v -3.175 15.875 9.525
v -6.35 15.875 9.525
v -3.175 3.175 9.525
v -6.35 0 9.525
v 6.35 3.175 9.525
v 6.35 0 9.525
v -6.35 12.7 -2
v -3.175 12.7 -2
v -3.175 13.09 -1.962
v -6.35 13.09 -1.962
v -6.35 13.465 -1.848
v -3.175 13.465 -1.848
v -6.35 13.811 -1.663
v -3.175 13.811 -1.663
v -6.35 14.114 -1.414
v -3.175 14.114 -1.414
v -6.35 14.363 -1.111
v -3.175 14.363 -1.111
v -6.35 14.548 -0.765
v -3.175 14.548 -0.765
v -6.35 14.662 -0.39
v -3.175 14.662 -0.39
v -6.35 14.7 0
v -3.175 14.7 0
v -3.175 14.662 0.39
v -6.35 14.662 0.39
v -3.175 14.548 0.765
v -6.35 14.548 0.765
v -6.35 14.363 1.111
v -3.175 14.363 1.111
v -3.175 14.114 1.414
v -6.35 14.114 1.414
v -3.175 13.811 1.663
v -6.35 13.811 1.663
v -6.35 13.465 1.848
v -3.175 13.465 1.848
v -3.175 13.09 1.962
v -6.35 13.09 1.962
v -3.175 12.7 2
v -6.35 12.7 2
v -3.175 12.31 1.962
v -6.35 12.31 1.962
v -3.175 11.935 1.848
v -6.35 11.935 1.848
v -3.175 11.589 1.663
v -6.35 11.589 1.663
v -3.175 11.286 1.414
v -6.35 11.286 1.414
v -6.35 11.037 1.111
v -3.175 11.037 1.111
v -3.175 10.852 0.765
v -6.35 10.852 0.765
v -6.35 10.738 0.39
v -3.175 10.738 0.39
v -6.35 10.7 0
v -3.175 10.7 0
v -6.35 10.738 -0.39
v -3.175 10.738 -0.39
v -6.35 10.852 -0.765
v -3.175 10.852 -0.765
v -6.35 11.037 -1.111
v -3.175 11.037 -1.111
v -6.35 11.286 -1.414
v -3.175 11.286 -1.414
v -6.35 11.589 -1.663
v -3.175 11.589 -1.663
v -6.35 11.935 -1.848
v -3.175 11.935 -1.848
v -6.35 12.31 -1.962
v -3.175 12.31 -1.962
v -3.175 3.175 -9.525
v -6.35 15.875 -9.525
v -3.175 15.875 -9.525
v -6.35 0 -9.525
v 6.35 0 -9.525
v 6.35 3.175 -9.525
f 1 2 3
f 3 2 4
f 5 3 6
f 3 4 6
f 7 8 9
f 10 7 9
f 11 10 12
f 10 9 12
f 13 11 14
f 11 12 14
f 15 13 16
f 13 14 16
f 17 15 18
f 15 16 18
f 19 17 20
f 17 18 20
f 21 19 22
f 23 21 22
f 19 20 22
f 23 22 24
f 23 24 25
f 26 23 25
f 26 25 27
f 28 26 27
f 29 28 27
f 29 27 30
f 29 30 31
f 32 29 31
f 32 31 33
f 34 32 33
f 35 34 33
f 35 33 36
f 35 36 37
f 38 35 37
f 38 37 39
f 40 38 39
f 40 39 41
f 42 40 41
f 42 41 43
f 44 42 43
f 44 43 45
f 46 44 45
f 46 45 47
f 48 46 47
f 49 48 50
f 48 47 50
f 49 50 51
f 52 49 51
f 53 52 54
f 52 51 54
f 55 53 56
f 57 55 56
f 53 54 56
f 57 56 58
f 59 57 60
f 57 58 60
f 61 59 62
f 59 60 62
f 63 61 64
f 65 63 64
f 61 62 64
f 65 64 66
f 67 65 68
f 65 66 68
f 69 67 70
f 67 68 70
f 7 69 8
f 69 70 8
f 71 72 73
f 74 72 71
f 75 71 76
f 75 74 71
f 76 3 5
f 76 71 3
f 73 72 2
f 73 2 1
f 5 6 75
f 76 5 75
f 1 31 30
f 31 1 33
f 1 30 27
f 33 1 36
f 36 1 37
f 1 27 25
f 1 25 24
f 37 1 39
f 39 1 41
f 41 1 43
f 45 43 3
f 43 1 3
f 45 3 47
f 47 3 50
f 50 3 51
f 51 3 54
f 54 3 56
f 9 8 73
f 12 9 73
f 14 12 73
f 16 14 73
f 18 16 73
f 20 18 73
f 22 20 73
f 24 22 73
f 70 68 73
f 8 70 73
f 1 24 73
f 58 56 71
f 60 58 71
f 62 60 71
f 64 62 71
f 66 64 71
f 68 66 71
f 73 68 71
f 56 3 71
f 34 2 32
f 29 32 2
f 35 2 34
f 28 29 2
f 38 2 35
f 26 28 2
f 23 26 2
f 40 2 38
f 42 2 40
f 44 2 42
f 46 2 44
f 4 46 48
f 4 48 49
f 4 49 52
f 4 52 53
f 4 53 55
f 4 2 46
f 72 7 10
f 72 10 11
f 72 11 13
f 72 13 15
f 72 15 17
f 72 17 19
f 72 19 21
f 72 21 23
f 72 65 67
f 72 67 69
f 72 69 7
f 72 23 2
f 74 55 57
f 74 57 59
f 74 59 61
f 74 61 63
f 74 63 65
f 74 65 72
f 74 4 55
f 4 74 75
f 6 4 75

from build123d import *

# Parameters (mm, degrees)
SKETCH1_W           = 9.525
SKETCH1_H           = 19.05
SKETCH1_W_2         = 3.175
BOSS_EXTRUDE1_DEPTH = 3.175
BOSS_EXTRUDE2_START = 3.175
SKETCH1_3_W         = 3.175
SKETCH1_3_H         = 19.05
BOSS_EXTRUDE2_DEPTH = 12.7
SKETCH2_R           = 2
CUT_EXTRUDE1_DEPTH  = 21.819867315


with BuildPart() as part:
    # Sketch1 → Boss-Extrude1 (new body)
    with BuildSketch(Plane(origin=(0, 0, 0), x_dir=(1, 0, 0), z_dir=(0, 1, 0))):
        with Locations((1.5875, 0)):
            Rectangle(SKETCH1_W, SKETCH1_H)
        with Locations((-4.7625, 0)):
            Rectangle(SKETCH1_W_2, SKETCH1_H)
    extrude(amount=BOSS_EXTRUDE1_DEPTH)

    # Sketch1<3> → Boss-Extrude2 (add)
    with BuildSketch(Plane(origin=(0, 0, 0), x_dir=(1, 0, 0), z_dir=(0, 1, 0)).offset(BOSS_EXTRUDE2_START)):
        with Locations((-4.7625, 0)):
            Rectangle(SKETCH1_3_W, SKETCH1_3_H)
    extrude(amount=BOSS_EXTRUDE2_DEPTH)

    # Sketch2 → Cut-Extrude1 (cut, through all)
    with BuildSketch(Plane(origin=(-3.175, 0, 0), x_dir=(0, 0, -1), z_dir=(1, 0, 0))):
        with Locations((0, 12.7)):
            Circle(SKETCH2_R)
    extrude(amount=-CUT_EXTRUDE1_DEPTH, mode=Mode.SUBTRACT)


solid = part.part
